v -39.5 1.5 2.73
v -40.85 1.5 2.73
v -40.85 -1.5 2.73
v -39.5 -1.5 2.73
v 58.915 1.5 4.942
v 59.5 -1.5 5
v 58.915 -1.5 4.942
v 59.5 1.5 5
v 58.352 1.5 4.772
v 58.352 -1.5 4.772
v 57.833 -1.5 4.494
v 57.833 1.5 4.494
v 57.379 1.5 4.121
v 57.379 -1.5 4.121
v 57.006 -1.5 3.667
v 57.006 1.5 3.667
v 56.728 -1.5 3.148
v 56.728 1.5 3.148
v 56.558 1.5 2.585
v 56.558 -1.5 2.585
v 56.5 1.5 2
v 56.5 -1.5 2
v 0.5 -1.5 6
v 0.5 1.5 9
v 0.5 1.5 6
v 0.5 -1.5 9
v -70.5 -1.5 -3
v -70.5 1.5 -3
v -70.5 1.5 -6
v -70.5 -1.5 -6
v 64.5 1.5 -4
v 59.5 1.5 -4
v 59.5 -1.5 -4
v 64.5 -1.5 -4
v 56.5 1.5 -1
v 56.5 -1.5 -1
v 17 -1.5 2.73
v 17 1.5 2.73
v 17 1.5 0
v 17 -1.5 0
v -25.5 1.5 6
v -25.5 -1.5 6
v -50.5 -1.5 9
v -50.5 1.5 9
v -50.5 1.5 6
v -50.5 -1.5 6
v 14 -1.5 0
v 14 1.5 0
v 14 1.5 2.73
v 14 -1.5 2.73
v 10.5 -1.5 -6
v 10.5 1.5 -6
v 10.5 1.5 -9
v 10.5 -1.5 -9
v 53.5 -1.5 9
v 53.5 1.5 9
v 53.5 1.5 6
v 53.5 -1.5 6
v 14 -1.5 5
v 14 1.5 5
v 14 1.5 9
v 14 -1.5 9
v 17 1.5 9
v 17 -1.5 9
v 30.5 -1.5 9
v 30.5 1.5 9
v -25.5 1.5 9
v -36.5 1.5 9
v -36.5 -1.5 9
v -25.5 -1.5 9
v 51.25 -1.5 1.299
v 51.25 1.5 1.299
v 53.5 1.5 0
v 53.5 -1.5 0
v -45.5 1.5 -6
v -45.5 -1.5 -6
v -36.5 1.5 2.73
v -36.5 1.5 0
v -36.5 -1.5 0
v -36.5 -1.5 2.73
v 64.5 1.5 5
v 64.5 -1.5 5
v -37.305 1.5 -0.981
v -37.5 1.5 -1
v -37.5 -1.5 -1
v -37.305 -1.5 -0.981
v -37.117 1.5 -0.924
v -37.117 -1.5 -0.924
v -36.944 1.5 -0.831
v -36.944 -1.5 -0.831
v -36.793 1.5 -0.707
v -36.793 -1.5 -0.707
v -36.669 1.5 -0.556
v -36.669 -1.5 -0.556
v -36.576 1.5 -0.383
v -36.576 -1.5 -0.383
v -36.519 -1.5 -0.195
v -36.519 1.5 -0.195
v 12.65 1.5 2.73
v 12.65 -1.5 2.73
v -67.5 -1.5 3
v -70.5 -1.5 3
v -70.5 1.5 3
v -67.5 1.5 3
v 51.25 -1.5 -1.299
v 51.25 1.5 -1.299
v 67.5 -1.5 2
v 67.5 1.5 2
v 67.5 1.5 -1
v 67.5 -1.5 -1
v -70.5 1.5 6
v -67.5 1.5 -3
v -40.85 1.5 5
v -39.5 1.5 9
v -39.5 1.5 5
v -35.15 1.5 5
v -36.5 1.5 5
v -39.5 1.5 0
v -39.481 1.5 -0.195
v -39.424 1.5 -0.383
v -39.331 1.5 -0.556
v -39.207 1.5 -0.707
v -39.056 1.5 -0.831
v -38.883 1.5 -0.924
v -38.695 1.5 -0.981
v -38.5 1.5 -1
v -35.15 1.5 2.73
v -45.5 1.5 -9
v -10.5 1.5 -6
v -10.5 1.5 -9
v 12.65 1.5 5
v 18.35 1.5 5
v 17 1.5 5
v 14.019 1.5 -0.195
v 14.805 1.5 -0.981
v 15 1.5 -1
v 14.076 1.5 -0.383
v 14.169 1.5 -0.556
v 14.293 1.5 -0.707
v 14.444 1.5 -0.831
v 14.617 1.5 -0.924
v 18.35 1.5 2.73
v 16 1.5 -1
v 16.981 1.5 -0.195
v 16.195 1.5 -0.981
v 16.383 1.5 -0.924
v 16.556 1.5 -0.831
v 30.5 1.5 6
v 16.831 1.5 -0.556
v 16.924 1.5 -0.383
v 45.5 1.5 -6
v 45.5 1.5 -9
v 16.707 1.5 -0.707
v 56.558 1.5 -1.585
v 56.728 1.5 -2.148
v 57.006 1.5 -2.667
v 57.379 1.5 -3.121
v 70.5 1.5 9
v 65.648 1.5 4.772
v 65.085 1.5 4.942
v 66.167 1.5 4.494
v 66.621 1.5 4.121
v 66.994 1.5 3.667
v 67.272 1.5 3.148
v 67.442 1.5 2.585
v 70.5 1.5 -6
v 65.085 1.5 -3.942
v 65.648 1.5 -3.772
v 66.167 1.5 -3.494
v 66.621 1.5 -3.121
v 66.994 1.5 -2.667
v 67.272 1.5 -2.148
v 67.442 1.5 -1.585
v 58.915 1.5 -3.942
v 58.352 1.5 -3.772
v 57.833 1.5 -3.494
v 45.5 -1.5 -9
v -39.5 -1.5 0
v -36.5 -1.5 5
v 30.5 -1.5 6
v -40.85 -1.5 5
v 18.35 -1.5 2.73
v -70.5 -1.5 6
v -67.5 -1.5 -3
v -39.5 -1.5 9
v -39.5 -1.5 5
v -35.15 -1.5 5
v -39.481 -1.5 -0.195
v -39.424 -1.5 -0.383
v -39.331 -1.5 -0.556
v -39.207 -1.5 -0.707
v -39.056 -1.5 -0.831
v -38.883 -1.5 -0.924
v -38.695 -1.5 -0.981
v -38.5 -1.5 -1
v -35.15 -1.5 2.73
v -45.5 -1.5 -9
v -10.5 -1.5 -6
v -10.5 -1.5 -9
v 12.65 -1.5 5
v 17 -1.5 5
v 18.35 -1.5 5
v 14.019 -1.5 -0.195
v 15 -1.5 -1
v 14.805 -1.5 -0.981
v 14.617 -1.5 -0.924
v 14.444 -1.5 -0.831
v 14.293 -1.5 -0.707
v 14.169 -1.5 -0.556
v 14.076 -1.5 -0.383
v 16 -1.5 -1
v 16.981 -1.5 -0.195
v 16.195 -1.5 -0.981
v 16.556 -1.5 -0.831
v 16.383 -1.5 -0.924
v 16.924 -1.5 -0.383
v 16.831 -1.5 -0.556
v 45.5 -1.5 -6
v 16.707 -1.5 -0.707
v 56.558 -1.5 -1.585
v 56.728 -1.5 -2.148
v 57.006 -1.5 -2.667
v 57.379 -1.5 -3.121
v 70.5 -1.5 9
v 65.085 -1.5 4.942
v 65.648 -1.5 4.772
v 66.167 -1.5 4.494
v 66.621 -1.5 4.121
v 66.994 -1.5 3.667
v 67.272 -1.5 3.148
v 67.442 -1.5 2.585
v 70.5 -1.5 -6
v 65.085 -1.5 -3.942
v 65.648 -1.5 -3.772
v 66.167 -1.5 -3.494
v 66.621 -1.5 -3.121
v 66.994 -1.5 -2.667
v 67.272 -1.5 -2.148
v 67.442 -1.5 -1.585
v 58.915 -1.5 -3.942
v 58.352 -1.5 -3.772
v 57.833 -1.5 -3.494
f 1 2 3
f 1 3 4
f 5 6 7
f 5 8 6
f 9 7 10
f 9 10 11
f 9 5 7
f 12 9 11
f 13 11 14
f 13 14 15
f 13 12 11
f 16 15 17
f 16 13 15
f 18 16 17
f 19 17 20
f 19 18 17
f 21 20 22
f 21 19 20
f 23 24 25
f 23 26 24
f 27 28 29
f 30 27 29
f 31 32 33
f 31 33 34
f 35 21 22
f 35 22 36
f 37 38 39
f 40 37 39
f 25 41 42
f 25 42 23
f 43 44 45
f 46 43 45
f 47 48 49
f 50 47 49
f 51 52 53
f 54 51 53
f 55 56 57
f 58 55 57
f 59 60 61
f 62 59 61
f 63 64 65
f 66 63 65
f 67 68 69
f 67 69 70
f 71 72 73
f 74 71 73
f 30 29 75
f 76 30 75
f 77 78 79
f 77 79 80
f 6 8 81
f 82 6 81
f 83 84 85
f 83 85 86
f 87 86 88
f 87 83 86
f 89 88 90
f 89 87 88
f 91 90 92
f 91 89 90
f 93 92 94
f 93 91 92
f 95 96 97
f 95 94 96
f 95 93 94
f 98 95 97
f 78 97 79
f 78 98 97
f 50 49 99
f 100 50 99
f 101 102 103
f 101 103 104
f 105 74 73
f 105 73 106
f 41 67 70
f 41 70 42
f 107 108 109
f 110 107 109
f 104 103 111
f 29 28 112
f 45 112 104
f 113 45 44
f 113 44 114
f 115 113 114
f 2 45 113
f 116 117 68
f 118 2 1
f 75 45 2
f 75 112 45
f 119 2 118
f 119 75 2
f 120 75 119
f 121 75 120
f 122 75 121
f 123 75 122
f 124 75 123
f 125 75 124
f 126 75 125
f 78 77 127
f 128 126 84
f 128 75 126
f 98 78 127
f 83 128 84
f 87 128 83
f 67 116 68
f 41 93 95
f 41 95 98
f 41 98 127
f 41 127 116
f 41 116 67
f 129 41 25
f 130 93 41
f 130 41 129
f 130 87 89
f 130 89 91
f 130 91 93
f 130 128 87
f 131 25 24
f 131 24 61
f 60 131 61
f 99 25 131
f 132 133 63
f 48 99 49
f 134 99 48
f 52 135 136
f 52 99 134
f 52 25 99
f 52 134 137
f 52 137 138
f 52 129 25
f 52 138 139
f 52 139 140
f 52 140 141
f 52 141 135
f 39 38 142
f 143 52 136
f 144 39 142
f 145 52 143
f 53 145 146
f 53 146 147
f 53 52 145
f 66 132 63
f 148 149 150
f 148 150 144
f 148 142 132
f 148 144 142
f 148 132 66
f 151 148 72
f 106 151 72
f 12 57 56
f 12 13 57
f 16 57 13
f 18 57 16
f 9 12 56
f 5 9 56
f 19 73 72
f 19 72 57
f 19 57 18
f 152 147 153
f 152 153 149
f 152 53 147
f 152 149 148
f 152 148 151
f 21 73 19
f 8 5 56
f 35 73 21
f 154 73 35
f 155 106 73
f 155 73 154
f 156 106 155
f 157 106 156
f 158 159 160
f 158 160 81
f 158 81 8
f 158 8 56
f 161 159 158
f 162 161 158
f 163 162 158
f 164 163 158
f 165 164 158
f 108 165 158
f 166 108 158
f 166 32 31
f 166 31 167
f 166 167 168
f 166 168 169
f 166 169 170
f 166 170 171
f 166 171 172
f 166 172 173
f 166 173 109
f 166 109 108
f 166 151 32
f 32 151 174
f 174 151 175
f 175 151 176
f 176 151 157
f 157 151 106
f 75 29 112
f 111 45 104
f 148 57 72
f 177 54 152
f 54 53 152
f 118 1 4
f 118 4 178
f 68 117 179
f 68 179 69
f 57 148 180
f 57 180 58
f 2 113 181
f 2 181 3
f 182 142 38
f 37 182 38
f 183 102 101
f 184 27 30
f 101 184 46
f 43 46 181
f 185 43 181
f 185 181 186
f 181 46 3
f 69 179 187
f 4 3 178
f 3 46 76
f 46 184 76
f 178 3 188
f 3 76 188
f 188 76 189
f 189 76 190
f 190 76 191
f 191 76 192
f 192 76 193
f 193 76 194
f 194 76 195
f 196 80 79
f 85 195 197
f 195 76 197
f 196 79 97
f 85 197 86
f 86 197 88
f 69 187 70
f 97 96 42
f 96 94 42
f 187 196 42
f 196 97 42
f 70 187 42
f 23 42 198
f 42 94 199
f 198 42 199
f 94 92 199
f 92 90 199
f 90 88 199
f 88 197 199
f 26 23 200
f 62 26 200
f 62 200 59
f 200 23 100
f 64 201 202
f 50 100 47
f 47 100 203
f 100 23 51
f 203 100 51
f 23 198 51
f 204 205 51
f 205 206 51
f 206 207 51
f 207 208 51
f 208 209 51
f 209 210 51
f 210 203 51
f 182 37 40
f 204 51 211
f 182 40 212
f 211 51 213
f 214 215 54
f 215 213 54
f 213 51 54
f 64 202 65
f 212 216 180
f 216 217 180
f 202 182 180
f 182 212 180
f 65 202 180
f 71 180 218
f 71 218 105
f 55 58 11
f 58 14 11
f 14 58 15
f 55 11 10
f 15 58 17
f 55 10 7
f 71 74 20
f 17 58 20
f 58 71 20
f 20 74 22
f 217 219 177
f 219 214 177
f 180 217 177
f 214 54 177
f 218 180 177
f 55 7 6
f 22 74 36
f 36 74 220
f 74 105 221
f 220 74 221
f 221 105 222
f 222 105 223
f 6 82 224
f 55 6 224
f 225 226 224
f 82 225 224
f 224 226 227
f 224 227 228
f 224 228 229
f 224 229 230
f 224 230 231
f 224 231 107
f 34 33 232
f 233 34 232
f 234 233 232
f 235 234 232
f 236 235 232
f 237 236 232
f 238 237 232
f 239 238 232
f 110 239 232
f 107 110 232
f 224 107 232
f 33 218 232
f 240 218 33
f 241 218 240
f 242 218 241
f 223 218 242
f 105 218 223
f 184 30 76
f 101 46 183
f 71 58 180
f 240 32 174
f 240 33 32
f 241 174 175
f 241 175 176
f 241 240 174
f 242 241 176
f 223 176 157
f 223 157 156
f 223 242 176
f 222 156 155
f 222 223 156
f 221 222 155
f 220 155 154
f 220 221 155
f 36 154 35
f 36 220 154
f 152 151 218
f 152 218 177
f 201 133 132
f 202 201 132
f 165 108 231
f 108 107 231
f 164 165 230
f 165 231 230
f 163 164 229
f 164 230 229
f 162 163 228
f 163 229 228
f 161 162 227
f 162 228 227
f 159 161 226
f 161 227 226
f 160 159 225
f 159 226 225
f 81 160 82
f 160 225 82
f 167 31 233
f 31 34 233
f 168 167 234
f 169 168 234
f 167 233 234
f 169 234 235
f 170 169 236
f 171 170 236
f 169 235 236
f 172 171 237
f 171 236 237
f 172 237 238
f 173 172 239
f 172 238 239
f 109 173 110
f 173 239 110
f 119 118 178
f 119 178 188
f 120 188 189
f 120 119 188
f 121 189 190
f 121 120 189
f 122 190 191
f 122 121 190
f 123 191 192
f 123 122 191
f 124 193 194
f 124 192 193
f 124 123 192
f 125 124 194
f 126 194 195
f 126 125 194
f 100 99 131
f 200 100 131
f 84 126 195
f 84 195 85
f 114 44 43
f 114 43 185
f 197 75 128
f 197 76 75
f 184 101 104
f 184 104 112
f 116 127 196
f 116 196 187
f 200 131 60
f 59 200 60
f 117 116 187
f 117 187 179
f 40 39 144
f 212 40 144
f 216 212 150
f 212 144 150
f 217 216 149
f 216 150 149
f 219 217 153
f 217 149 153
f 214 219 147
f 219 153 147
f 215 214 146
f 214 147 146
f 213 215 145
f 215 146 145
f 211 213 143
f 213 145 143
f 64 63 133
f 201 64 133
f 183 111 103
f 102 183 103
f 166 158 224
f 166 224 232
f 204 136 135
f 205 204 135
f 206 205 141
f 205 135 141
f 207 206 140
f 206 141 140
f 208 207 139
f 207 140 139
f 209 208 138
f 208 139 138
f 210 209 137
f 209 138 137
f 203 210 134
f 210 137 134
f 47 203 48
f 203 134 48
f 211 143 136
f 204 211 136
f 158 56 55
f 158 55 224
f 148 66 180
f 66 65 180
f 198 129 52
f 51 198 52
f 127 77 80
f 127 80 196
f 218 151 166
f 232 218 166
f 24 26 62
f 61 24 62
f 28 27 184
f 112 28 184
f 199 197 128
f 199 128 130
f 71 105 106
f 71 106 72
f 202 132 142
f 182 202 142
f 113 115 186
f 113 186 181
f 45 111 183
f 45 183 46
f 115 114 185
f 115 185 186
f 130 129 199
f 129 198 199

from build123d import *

# Parameters (mm, degrees)
SKETCH1_W                = 141
SKETCH1_H                = 12
BOSS_EXTRUDE1_DEPTH      = 1.5
SKETCH2_W                = 30
SKETCH2_H                = 3
SKETCH2_W_2              = 17
BOSS_EXTRUDE2_DEPTH      = 1.5
SKETCH12_W               = 25
SKETCH12_H               = 3
BOSS_EXTRUDE3_DEPTH      = 1.5
CUT_EXTRUDE8_DEPTH       = 2.5
CUT_EXTRUDE8_DEPTH_BACK  = 2.5
SKETCH13_W               = 35
SKETCH13_H               = 3
BOSS_EXTRUDE4_DEPTH      = 1.5
SKETCH15_W               = 11
SKETCH15_H               = 9
CUT_EXTRUDE10_DEPTH      = 2.5
CUT_EXTRUDE10_DEPTH_BACK = 2.5
FILLET4_R                = 3
CUT_EXTRUDE11_DEPTH      = 2.5
CUT_EXTRUDE11_DEPTH_BACK = 2.5
SKETCH17_W               = 3
SKETCH17_H               = 6
CUT_EXTRUDE12_DEPTH      = 2.5
CUT_EXTRUDE12_DEPTH_BACK = 2.5


with BuildPart() as part:
    # Sketch1 → Boss-Extrude1 (new body, symmetric)
    with BuildSketch(Plane(origin=(0, 0, 0), x_dir=(1, 0, 0), z_dir=(0, 1, 0))):
        Rectangle(SKETCH1_W, SKETCH1_H)
    extrude(amount=BOSS_EXTRUDE1_DEPTH, both=True)

    # Sketch2 → Boss-Extrude2 (add, symmetric)
    with BuildSketch(Plane(origin=(0, 0, 0), x_dir=(1, 0, 0), z_dir=(0, 1, 0))):
        with Locations((15.5, -7.5)):
            Rectangle(SKETCH2_W, SKETCH2_H)
        with Locations((62, -7.5)):
            Rectangle(SKETCH2_W_2, SKETCH2_H)
    extrude(amount=BOSS_EXTRUDE2_DEPTH, both=True)

    # Sketch12 → Boss-Extrude3 (add, symmetric)
    with BuildSketch(Plane(origin=(0, 0, 0), x_dir=(1, 0, 0), z_dir=(0, 1, 0))):
        with Locations((-38, -7.5)):
            Rectangle(SKETCH12_W, SKETCH12_H)
    extrude(amount=BOSS_EXTRUDE3_DEPTH, both=True)

    # Sketch11 → Cut-Extrude8 (cut, two sides)
    with BuildSketch(Plane(origin=(0, 0, 0), x_dir=(1, 0, 0), z_dir=(0, 1, 0))) as cut_extrude8_sk:
        with BuildLine():
            Line((-39.5, -2.73), (-39.5, 0))
            ThreePointArc((-39.5, 0), (-39.207106781, 0.707106781), (-38.5, 1))
            Line((-38.5, 1), (-37.5, 1))
            ThreePointArc((-37.5, 1), (-36.792893219, 0.707106781), (-36.5, 0))
            Line((-36.5, 0), (-36.5, -2.73))
            Line((-36.5, -2.73), (-35.15, -2.73))
            Line((-35.15, -2.73), (-35.15, -5))
            Line((-35.15, -5), (-36.5, -5))
            Line((-36.5, -5), (-36.5, -9))
            Line((-36.5, -9), (-39.5, -9))
            Line((-39.5, -9), (-39.5, -5))
            Line((-39.5, -5), (-40.85, -5))
            Line((-40.85, -5), (-40.85, -2.73))
            Line((-40.85, -2.73), (-39.5, -2.73))
        make_face()
        with BuildLine():
            Line((14, -9), (17, -9))
            Line((17, -9), (17, -5))
            Line((17, -5), (18.35, -5))
            Line((18.35, -5), (18.35, -2.73))
            Line((18.35, -2.73), (17, -2.73))
            Line((17, -2.73), (17, 0))
            ThreePointArc((17, 0), (16.707106781, 0.707106781), (16, 1))
            Line((16, 1), (15, 1))
            ThreePointArc((15, 1), (14.292893219, 0.707106781), (14, 0))
            Line((14, 0), (14, -2.73))
            Line((14, -2.73), (12.65, -2.73))
            Line((12.65, -2.73), (12.65, -5))
            Line((12.65, -5), (14, -5))
            Line((14, -5), (14, -9))
        make_face()
    extrude(amount=CUT_EXTRUDE8_DEPTH, mode=Mode.SUBTRACT)
    extrude(cut_extrude8_sk.sketch, amount=-CUT_EXTRUDE8_DEPTH_BACK, mode=Mode.SUBTRACT)

    # Sketch13 → Boss-Extrude4 (add, symmetric)
    with BuildSketch(Plane(origin=(0, 0, 0), x_dir=(1, 0, 0), z_dir=(0, 1, 0))):
        with Locations((-28, 7.5)):
            Rectangle(SKETCH13_W, SKETCH13_H)
        with Locations((28, 7.5)):
            Rectangle(SKETCH13_W, SKETCH13_H)
    extrude(amount=BOSS_EXTRUDE4_DEPTH, both=True)

    # Sketch15 → Cut-Extrude10 (cut, two sides)
    with BuildSketch(Plane(origin=(0, 0, 0), x_dir=(1, 0, 0), z_dir=(0, 1, 0))) as cut_extrude10_sk:
        with Locations((62, -0.5)):
            Rectangle(SKETCH15_W, SKETCH15_H)
    extrude(amount=CUT_EXTRUDE10_DEPTH, mode=Mode.SUBTRACT)
    extrude(cut_extrude10_sk.sketch, amount=-CUT_EXTRUDE10_DEPTH_BACK, mode=Mode.SUBTRACT)

    # Fillet4
    fillet4_edges = [part.edges().sort_by_distance(p)[0] for p in [
        (56.5, 0, 5),
        (56.5, 0, -4),
        (67.5, 0, -4),
        (67.5, 0, 5),
    ]]
    fillet(fillet4_edges, radius=FILLET4_R)

    # Sketch16 → Cut-Extrude11 (cut, two sides)
    with BuildSketch(Plane(origin=(0, 0, 0), x_dir=(1, 0, 0), z_dir=(0, 1, 0))) as cut_extrude11_sk:
        Polygon((53.5, 0), (51.25, 1.299038106), (51.25, -1.299038106), align=None)
    extrude(amount=CUT_EXTRUDE11_DEPTH, mode=Mode.SUBTRACT)
    extrude(cut_extrude11_sk.sketch, amount=-CUT_EXTRUDE11_DEPTH_BACK, mode=Mode.SUBTRACT)

    # Sketch17 → Cut-Extrude12 (cut, two sides)
    with BuildSketch(Plane(origin=(0, 0, 0), x_dir=(1, 0, 0), z_dir=(0, 1, 0))) as cut_extrude12_sk:
        with Locations((-69, 0)):
            Rectangle(SKETCH17_W, SKETCH17_H)
    extrude(amount=CUT_EXTRUDE12_DEPTH, mode=Mode.SUBTRACT)
    extrude(cut_extrude12_sk.sketch, amount=-CUT_EXTRUDE12_DEPTH_BACK, mode=Mode.SUBTRACT)


solid = part.part
